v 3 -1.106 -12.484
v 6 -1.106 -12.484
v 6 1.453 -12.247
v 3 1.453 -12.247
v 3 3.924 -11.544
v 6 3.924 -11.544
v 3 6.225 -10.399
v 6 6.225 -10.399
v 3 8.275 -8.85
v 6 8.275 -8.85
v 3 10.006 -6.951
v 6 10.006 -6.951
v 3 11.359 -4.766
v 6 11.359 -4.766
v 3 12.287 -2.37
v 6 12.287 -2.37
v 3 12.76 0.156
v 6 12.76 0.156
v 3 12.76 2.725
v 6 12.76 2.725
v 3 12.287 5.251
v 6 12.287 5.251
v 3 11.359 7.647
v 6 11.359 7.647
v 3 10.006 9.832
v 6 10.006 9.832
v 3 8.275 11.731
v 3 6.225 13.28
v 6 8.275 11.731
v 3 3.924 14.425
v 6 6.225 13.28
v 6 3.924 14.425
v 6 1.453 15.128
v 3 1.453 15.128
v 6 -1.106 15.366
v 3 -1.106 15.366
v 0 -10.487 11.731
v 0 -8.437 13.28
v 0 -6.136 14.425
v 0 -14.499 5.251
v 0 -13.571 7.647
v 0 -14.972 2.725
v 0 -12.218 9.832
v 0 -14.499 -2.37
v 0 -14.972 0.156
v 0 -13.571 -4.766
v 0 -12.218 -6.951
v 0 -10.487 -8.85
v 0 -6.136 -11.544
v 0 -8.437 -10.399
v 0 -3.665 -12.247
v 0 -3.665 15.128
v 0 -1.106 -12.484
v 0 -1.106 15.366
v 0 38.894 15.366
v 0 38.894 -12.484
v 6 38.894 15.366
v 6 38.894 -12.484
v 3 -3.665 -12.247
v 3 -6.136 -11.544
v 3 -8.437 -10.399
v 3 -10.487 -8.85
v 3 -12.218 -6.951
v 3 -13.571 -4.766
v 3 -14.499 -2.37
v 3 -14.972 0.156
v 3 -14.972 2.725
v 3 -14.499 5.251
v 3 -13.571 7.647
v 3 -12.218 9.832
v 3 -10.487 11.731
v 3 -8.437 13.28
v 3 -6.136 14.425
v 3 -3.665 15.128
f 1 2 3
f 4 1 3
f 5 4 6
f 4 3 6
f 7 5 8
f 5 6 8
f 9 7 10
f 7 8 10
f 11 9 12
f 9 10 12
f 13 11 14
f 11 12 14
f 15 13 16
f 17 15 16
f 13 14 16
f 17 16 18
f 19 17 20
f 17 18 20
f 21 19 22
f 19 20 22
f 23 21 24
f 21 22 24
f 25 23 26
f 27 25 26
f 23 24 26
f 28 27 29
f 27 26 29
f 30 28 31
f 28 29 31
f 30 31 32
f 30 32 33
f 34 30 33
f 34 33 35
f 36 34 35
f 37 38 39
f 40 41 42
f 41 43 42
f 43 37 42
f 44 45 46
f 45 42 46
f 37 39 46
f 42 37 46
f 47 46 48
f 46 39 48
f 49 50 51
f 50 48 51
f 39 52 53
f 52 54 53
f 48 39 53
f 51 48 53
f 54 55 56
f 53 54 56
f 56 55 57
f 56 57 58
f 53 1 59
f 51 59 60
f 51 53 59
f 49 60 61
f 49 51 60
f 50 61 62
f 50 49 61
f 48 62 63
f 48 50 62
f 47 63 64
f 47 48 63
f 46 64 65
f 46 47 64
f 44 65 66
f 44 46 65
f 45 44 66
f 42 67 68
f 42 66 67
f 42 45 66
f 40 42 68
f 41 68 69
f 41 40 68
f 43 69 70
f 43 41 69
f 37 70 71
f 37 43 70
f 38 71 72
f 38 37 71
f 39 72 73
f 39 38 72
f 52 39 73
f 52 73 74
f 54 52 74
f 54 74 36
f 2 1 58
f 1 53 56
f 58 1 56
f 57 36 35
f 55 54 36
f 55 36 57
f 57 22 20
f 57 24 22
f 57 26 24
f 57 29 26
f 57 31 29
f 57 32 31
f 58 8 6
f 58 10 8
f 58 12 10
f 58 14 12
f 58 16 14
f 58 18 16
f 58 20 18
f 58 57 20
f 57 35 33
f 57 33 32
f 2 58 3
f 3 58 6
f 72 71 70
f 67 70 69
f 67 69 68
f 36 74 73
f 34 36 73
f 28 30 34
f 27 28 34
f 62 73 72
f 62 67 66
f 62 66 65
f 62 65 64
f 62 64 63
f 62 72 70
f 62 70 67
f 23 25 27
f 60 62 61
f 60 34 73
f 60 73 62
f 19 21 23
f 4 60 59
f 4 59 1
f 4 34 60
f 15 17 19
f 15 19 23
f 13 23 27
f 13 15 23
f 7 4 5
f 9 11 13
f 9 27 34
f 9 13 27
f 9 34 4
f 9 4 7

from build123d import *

# Parameters (mm, degrees)
ESQUISSE1_W             = 27.85
ESQUISSE1_H             = 40
BOSS_EXTRU_1_DEPTH      = 6
ESQUISSE2_R             = 13.925
ENL_V_MAT_EXTRU_1_DEPTH = 3


with BuildPart() as part:
    # Esquisse1 → Boss.-Extru.1 (new body)
    with BuildSketch(Plane(origin=(0, 0, 0), x_dir=(0, 0, -1), z_dir=(1, 0, 0))):
        with Locations((-1.440517241, 18.893965517)):
            Rectangle(ESQUISSE1_W, ESQUISSE1_H)
        with BuildLine():
            ThreePointArc((12.484482759, -1.106034483), (-1.440517241, -15.031034483), (-15.365517241, -1.106034483))
            Line((-15.365517241, -1.106034483), (12.484482759, -1.106034483))
        make_face()
    extrude(amount=BOSS_EXTRU_1_DEPTH)

    # Esquisse2 → Enlèv. mat.-Extru.1 (cut)
    with BuildSketch(Plane(origin=(6, 0, 0), x_dir=(0, 0, -1), z_dir=(1, 0, 0))):
        with Locations((-1.440517241, -1.106034483)):
            Circle(ESQUISSE2_R)
    extrude(amount=-ENL_V_MAT_EXTRU_1_DEPTH, mode=Mode.SUBTRACT)


solid = part.part
